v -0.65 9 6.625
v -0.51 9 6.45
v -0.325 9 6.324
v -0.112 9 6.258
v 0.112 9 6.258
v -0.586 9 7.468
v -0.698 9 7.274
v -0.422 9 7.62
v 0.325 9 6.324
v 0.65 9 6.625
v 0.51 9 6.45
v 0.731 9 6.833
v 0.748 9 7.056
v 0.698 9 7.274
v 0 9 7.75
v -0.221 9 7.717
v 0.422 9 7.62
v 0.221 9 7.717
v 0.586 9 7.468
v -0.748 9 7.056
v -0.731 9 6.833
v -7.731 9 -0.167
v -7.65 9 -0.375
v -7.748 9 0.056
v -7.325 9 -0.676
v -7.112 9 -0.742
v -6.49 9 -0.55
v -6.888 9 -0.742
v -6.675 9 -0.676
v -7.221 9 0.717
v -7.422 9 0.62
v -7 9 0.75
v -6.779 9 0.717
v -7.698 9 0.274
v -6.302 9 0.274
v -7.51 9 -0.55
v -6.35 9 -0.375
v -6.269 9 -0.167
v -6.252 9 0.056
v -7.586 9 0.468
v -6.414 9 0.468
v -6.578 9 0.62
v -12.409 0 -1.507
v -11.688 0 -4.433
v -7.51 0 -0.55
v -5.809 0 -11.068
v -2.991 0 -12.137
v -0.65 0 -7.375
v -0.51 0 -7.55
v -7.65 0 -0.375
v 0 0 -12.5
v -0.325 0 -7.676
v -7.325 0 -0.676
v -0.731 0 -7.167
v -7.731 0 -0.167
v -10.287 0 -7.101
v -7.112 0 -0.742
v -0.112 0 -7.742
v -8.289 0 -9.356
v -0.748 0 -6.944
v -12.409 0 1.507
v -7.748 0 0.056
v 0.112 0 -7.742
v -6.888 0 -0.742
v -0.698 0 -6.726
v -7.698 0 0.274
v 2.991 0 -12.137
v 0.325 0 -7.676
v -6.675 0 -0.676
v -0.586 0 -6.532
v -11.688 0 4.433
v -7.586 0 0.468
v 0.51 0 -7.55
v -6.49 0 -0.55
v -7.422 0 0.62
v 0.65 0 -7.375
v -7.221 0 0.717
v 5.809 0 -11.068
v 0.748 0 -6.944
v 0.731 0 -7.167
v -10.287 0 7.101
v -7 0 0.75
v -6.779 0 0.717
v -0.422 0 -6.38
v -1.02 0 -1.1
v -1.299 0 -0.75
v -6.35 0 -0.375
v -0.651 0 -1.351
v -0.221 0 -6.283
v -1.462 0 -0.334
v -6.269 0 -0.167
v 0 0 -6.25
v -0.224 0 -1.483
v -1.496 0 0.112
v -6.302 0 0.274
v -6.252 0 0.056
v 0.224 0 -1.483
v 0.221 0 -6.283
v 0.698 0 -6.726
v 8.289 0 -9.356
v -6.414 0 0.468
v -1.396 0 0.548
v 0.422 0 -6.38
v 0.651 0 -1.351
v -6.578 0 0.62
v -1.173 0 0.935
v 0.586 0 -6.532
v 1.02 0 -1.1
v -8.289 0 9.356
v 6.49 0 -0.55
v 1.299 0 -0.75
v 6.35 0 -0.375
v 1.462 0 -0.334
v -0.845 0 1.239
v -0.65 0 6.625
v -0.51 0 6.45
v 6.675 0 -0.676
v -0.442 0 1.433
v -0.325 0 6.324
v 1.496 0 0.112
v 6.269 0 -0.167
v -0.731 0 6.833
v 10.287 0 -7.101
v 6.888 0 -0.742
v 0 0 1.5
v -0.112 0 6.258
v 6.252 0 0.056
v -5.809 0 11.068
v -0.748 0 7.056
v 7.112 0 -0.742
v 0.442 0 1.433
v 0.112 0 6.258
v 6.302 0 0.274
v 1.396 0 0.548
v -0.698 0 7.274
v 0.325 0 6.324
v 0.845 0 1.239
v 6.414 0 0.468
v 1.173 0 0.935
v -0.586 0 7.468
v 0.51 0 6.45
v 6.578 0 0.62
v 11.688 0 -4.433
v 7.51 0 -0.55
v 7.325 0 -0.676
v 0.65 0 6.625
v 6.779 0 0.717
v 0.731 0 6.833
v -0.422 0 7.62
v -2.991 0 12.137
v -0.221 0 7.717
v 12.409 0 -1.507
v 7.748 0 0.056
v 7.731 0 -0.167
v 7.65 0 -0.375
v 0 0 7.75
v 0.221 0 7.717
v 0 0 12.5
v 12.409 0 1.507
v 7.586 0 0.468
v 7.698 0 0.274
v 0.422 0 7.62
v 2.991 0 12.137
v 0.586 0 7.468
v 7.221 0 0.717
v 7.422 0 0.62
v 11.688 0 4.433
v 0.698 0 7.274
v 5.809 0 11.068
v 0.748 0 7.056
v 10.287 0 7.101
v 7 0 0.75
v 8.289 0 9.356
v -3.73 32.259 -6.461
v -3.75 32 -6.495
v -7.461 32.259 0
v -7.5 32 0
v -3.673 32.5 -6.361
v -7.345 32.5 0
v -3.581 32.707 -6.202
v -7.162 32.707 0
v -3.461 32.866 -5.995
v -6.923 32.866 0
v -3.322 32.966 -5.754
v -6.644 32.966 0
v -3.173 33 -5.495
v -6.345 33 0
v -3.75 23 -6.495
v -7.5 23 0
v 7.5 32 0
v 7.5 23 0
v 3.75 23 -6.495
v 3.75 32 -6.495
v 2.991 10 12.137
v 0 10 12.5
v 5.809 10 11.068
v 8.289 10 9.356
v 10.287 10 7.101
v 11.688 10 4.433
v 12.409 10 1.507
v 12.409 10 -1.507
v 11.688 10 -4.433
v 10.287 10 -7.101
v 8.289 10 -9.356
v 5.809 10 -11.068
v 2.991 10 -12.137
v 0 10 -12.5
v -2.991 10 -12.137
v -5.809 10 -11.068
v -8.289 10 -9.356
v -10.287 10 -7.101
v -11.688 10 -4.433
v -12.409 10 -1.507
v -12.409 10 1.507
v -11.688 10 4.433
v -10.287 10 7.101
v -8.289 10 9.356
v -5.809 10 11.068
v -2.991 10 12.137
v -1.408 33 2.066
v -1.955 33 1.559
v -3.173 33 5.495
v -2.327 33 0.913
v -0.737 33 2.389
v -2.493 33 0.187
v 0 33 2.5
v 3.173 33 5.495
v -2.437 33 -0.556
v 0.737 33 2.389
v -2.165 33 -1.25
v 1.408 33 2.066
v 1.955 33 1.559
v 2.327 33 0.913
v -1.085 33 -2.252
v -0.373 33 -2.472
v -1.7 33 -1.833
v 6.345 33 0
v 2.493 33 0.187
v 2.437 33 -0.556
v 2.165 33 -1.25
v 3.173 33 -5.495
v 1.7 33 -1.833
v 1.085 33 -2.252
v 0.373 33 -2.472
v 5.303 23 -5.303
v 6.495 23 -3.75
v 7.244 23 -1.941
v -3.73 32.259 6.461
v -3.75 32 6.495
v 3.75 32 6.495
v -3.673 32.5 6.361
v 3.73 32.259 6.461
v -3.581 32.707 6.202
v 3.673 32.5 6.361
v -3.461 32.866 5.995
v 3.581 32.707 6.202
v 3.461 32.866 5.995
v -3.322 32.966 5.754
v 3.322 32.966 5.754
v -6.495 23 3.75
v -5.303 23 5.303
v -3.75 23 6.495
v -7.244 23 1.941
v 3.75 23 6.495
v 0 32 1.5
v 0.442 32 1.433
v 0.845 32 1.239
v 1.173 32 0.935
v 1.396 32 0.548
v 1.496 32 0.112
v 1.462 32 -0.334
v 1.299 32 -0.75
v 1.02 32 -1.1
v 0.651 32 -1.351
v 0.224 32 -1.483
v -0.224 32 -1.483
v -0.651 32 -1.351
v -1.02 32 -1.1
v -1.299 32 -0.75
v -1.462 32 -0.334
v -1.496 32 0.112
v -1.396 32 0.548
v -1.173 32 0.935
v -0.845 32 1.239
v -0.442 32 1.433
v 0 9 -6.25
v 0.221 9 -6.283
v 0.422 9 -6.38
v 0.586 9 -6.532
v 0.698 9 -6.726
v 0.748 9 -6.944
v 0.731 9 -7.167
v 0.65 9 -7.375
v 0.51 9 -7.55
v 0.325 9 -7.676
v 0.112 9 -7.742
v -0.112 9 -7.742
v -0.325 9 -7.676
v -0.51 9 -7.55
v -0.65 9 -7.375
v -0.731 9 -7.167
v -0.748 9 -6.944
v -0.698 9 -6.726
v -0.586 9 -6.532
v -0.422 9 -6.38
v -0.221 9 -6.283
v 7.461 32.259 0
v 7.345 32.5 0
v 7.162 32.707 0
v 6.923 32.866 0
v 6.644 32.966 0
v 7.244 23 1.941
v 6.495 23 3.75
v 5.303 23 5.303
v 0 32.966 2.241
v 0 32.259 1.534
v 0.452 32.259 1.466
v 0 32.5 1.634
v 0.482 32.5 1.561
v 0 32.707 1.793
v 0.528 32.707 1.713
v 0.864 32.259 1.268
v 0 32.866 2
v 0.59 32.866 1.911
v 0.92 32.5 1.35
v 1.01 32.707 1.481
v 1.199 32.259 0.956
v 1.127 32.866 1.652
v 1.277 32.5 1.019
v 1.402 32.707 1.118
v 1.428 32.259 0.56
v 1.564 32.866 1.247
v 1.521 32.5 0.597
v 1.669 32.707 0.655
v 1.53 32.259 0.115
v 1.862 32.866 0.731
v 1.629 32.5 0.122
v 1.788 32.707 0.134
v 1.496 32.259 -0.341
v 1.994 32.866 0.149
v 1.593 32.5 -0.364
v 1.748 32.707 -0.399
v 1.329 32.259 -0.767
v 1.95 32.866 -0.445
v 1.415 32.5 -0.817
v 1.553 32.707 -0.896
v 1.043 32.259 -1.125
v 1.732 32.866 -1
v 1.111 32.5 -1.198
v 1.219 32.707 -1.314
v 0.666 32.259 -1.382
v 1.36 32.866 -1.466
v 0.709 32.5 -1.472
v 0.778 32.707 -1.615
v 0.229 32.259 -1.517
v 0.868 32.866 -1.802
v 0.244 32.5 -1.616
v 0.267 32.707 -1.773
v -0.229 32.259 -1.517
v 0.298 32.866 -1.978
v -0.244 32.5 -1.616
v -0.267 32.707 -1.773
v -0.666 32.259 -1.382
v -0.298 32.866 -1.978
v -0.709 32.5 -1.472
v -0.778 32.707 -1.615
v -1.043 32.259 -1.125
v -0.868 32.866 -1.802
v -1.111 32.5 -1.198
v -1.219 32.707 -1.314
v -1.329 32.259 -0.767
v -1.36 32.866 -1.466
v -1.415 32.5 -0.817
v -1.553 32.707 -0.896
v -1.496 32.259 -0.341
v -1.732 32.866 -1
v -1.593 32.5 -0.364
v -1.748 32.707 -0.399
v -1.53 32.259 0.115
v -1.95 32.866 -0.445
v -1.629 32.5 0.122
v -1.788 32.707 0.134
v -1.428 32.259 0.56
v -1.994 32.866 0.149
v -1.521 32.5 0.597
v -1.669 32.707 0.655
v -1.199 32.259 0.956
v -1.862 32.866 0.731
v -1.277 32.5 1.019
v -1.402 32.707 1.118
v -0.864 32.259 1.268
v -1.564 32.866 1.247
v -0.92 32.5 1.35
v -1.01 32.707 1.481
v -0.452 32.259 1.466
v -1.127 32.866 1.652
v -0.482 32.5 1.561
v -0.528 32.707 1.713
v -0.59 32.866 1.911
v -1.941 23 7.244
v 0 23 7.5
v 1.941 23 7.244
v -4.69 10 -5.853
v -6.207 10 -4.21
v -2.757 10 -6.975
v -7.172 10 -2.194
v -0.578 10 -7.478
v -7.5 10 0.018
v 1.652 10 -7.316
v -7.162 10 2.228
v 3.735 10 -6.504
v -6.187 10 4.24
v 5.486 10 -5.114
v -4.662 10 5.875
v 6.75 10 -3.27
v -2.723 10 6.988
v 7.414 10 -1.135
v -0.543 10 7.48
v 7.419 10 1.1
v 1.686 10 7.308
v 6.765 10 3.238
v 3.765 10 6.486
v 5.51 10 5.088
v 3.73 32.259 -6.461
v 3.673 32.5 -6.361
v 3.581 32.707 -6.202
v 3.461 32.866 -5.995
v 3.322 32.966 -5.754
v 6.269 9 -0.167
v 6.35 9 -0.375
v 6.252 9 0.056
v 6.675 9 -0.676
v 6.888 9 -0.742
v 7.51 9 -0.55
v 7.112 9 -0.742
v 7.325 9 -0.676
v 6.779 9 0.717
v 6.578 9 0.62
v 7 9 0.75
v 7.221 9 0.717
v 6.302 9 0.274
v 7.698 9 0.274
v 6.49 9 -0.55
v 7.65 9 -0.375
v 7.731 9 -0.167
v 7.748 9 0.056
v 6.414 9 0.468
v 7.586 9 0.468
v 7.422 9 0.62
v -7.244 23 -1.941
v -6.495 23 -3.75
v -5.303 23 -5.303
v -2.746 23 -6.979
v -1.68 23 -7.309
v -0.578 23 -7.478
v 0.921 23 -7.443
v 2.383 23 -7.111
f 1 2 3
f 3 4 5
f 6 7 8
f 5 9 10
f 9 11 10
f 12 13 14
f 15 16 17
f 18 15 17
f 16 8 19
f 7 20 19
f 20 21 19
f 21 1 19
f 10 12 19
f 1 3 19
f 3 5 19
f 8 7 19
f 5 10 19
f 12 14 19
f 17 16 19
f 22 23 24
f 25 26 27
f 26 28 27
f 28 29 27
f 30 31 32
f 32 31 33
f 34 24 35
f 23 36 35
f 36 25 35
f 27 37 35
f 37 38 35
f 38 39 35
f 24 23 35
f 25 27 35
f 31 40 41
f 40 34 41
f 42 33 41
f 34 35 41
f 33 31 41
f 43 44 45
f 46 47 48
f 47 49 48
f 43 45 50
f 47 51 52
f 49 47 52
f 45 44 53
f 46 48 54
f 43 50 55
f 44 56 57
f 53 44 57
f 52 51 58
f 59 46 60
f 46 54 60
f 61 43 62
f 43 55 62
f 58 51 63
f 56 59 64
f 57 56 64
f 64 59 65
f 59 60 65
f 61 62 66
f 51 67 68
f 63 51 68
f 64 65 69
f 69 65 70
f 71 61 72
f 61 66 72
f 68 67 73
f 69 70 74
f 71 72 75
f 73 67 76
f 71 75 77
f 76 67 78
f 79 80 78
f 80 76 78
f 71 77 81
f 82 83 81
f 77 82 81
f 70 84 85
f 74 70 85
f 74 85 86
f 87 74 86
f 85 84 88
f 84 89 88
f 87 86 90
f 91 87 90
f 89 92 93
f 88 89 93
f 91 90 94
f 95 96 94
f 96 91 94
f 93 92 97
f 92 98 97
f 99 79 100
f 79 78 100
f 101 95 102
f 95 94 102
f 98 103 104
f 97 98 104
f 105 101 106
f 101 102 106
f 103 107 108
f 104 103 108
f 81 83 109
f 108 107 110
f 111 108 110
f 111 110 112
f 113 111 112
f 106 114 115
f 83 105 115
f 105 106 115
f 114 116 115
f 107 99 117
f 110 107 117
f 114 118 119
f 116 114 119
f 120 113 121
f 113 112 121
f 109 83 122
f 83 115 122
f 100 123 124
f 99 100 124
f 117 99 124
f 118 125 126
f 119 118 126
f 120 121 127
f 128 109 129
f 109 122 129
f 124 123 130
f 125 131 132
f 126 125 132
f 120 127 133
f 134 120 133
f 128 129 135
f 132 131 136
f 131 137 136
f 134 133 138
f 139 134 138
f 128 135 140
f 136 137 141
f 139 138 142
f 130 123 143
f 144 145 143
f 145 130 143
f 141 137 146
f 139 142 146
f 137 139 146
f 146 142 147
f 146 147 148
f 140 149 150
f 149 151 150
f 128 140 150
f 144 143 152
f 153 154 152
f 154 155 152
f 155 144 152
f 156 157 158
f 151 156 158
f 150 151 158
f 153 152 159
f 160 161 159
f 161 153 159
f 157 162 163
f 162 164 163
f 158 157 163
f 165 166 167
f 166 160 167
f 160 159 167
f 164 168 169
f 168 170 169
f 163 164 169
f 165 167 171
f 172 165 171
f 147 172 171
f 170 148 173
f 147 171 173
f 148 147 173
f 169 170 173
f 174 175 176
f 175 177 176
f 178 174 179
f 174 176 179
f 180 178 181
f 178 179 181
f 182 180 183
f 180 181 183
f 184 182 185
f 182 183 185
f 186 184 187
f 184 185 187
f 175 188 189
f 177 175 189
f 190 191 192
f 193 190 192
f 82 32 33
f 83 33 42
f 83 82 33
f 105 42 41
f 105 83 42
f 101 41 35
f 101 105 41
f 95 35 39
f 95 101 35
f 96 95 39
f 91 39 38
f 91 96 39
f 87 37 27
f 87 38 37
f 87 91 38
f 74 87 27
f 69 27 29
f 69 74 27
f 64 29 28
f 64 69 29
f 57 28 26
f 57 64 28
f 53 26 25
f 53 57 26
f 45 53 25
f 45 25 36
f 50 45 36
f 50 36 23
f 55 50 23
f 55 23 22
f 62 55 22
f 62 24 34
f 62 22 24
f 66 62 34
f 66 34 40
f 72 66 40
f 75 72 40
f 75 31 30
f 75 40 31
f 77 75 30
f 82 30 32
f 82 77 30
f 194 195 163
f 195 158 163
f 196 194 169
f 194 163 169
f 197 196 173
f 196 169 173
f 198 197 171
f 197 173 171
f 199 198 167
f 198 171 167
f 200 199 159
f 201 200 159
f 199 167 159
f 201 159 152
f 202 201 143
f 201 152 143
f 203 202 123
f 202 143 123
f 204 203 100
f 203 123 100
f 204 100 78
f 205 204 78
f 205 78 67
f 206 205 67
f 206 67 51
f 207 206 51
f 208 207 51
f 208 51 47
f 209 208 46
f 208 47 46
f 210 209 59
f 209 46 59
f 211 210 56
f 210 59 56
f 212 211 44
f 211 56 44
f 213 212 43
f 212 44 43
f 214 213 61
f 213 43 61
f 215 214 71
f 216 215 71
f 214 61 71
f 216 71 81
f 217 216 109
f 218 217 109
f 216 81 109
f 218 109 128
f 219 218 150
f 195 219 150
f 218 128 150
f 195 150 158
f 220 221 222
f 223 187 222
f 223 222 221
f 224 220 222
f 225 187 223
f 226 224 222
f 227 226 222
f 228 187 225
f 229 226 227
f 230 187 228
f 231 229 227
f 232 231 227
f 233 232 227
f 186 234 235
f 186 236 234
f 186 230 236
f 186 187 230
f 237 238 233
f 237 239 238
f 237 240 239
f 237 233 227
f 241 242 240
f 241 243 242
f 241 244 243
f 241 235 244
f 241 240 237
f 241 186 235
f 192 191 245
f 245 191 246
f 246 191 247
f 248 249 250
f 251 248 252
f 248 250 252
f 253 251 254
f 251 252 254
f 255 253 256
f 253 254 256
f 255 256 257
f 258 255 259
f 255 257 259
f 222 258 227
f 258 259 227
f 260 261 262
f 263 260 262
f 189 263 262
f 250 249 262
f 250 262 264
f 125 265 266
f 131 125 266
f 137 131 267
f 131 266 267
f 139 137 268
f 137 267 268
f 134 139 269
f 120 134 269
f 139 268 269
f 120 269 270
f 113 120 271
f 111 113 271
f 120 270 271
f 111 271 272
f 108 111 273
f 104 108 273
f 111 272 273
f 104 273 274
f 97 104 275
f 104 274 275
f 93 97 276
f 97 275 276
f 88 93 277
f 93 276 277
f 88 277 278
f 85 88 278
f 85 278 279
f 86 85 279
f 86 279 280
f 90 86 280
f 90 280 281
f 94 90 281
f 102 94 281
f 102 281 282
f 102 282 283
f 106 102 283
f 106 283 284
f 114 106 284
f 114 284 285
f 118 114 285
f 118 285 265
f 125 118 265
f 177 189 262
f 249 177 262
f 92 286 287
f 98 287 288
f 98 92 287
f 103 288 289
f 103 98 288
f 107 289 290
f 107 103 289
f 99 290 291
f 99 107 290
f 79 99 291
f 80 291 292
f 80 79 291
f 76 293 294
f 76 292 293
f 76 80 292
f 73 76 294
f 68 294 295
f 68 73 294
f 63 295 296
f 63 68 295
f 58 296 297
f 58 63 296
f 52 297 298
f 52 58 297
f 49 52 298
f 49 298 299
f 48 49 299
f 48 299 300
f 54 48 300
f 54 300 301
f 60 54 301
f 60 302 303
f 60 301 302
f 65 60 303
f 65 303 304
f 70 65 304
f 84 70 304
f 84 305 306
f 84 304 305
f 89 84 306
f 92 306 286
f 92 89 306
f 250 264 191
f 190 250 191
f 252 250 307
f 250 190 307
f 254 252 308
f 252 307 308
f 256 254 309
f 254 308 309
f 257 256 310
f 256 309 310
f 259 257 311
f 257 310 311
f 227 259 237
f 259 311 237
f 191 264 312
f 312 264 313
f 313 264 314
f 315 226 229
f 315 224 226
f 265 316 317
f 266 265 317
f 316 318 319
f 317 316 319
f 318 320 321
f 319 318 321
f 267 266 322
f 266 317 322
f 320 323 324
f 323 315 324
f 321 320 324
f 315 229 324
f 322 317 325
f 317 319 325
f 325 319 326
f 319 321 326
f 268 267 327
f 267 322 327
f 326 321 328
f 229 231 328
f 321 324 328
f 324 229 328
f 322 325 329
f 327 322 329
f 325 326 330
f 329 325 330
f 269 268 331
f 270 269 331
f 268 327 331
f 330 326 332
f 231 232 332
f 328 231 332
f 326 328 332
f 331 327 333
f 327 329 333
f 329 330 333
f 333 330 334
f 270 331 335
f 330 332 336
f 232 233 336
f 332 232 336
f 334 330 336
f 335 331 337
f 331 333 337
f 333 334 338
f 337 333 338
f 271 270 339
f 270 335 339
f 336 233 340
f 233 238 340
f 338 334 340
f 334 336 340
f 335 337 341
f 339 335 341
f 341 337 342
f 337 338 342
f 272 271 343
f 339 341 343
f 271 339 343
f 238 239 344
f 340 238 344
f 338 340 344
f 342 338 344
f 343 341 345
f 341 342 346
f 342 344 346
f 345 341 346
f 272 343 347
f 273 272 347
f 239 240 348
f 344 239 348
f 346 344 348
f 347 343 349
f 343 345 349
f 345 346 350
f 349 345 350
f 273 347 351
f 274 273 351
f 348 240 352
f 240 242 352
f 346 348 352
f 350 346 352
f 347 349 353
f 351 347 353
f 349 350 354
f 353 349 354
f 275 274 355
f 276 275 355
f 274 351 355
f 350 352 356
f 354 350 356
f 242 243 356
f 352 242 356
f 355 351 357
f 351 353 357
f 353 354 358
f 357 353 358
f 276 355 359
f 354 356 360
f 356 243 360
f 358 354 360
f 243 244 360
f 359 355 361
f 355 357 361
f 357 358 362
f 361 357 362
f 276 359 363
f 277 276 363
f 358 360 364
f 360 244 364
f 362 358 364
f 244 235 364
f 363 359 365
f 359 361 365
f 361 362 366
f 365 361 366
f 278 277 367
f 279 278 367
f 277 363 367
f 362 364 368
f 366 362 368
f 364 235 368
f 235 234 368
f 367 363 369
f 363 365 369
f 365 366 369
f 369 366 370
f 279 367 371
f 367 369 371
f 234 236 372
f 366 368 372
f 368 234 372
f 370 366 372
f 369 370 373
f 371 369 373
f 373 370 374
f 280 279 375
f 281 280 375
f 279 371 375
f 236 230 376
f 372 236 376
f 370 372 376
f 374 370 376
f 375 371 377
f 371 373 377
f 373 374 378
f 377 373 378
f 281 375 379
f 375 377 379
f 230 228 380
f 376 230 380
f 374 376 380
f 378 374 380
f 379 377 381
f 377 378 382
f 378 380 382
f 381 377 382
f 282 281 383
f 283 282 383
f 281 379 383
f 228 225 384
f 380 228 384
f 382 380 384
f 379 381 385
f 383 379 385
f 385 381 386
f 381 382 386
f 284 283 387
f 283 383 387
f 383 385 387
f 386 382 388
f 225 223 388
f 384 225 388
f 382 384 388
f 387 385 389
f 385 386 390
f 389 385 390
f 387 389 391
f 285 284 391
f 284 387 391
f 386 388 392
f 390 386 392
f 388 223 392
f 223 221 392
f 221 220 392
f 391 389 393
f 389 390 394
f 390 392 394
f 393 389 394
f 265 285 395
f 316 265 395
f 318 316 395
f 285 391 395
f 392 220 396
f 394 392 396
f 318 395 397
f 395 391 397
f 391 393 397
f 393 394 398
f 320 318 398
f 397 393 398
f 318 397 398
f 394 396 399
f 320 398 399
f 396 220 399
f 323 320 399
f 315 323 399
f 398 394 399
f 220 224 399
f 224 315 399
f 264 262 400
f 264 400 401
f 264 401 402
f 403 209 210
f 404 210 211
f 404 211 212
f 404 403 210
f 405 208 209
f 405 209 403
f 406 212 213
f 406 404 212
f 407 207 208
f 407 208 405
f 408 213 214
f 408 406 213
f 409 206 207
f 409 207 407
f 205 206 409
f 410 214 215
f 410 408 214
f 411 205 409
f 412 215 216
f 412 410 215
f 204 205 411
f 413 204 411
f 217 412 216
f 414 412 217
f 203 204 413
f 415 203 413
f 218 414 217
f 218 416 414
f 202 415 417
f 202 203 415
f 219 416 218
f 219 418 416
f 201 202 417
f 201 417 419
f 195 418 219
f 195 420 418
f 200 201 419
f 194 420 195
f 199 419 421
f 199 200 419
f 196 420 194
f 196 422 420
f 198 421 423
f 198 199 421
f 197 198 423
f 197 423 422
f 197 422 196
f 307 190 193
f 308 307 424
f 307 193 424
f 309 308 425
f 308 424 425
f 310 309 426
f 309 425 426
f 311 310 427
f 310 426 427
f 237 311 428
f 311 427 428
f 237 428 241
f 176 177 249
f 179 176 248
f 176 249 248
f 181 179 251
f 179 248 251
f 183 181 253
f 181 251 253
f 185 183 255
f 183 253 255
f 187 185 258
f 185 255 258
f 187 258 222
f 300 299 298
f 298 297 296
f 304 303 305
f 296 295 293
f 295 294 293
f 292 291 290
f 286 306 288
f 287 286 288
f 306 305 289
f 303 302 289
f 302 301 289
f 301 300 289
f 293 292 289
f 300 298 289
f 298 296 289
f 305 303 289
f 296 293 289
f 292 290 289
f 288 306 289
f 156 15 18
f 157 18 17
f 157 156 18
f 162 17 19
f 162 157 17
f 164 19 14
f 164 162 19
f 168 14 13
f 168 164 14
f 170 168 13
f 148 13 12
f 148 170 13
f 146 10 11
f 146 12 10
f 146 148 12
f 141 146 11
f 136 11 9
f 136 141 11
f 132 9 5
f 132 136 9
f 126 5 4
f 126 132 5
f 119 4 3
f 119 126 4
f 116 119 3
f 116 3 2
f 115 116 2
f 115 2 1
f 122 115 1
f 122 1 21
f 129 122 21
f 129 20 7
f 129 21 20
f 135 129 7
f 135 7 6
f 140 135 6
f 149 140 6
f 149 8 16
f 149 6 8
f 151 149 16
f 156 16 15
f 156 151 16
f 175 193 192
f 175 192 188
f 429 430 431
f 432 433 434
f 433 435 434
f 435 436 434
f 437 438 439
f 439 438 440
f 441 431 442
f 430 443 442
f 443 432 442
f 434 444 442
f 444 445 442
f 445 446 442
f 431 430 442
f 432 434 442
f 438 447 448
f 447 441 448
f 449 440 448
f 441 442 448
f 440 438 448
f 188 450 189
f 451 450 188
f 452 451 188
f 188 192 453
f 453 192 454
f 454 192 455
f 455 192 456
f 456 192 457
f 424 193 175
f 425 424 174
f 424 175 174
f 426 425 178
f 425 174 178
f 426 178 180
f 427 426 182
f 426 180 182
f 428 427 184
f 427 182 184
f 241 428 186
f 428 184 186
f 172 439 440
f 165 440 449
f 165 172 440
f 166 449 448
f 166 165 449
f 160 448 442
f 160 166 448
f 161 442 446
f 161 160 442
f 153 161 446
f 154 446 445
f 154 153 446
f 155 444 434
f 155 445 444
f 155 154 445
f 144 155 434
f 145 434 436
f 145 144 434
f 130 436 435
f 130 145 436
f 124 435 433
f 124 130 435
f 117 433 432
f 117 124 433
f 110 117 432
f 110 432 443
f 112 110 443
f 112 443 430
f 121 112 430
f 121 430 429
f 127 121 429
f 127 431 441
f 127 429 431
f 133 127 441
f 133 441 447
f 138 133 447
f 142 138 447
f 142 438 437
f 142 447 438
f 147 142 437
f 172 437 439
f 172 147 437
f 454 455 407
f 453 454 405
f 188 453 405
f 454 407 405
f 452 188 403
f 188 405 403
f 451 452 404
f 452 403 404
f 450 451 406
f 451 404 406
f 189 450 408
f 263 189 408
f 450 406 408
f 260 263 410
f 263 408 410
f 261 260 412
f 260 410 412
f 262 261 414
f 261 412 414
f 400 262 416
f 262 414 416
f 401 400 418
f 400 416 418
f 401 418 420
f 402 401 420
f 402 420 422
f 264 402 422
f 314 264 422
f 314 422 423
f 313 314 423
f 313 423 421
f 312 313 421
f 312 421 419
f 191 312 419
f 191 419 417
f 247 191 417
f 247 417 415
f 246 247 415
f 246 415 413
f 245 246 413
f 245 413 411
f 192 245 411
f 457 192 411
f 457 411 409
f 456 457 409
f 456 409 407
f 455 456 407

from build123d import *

# Parameters (mm, degrees)
CROQUIS1_R              = 12.5
CROQUIS1_R_2            = 0.75
SALIENTE_EXTRUIR1_DEPTH = 10
CROQUIS2_R              = 7.5
SALIENTE_EXTRUIR2_DEPTH = 13
SALIENTE_EXTRUIR4_START = -1
CROQUIS5_R              = 12.5
SALIENTE_EXTRUIR4_DEPTH = 1
SALIENTE_EXTRUIR3_DEPTH = 10
CROQUIS4_R              = 1.5
CORTAR_EXTRUIR1_DEPTH   = 38.436613095
REDONDEO1_R             = 1


with BuildPart() as part:
    # Croquis1 → Saliente-Extruir1 (new body)
    with BuildSketch(Plane(origin=(0, 0, 0), x_dir=(1, 0, 0), z_dir=(0, 1, 0))):
        with Locations(Location((0, 0, 0), (0, 0, 270))):
            Circle(CROQUIS1_R)
        with Locations(Location((7, 0, 0), (0, 0, 270))):
            Circle(CROQUIS1_R_2, mode=Mode.SUBTRACT)
        with Locations(Location((0, -7, 0), (0, 0, 270))):
            Circle(CROQUIS1_R_2, mode=Mode.SUBTRACT)
        with Locations(Location((-7, 0, 0), (0, 0, 270))):
            Circle(CROQUIS1_R_2, mode=Mode.SUBTRACT)
        with Locations(Location((0, 7, 0), (0, 0, 270))):
            Circle(CROQUIS1_R_2, mode=Mode.SUBTRACT)
    extrude(amount=SALIENTE_EXTRUIR1_DEPTH)

    # Croquis2 → Saliente-Extruir2 (add)
    with BuildSketch(Plane(origin=(0, 10, 0), x_dir=(1, 0, 0), z_dir=(0, 1, 0))):
        with Locations(Location((0, 0, 0), (0, 0, 94.421562439))):
            Circle(CROQUIS2_R)
    extrude(amount=SALIENTE_EXTRUIR2_DEPTH)

    # Croquis5 → Saliente-Extruir4 (add)
    with BuildSketch(Plane(origin=(0, 10, 0), x_dir=(1, 0, 0), z_dir=(0, 1, 0)).offset(SALIENTE_EXTRUIR4_START)):
        with Locations(Location((0, 0, 0), (0, 0, 270))):
            Circle(CROQUIS5_R)
    extrude(amount=SALIENTE_EXTRUIR4_DEPTH)

    # Croquis3 → Saliente-Extruir3 (add)
    with BuildSketch(Plane(origin=(0, 23, 0), x_dir=(1, 0, 0), z_dir=(0, 1, 0))):
        Polygon((7.5, 0), (3.75, 6.495190528), (-3.75, 6.495190528), (-7.5, 0), (-3.75, -6.495190528), (3.75, -6.495190528), align=None)
    extrude(amount=SALIENTE_EXTRUIR3_DEPTH)

    # Croquis4 → Cortar-Extruir1 (cut, through all)
    with BuildSketch(Plane(origin=(0, 33, 0), x_dir=(1, 0, 0), z_dir=(0, 1, 0))):
        with Locations(Location((0, 0, 0), (0, 0, 270))):
            Circle(CROQUIS4_R)
    extrude(amount=-CORTAR_EXTRUIR1_DEPTH, mode=Mode.SUBTRACT)

    # Redondeo1
    redondeo1_edges = [part.edges().sort_by_distance(p)[0] for p in [
        (5.625, 33, 3.247595264),
        (5.625, 33, -3.247595264),
        (0, 33, -6.495190528),
        (-5.625, 33, -3.247595264),
        (-5.625, 33, 3.247595264),
        (0, 33, 6.495190528),
        (0, 33, -1.5),
    ]]
    fillet(redondeo1_edges, radius=REDONDEO1_R)


solid = part.part
